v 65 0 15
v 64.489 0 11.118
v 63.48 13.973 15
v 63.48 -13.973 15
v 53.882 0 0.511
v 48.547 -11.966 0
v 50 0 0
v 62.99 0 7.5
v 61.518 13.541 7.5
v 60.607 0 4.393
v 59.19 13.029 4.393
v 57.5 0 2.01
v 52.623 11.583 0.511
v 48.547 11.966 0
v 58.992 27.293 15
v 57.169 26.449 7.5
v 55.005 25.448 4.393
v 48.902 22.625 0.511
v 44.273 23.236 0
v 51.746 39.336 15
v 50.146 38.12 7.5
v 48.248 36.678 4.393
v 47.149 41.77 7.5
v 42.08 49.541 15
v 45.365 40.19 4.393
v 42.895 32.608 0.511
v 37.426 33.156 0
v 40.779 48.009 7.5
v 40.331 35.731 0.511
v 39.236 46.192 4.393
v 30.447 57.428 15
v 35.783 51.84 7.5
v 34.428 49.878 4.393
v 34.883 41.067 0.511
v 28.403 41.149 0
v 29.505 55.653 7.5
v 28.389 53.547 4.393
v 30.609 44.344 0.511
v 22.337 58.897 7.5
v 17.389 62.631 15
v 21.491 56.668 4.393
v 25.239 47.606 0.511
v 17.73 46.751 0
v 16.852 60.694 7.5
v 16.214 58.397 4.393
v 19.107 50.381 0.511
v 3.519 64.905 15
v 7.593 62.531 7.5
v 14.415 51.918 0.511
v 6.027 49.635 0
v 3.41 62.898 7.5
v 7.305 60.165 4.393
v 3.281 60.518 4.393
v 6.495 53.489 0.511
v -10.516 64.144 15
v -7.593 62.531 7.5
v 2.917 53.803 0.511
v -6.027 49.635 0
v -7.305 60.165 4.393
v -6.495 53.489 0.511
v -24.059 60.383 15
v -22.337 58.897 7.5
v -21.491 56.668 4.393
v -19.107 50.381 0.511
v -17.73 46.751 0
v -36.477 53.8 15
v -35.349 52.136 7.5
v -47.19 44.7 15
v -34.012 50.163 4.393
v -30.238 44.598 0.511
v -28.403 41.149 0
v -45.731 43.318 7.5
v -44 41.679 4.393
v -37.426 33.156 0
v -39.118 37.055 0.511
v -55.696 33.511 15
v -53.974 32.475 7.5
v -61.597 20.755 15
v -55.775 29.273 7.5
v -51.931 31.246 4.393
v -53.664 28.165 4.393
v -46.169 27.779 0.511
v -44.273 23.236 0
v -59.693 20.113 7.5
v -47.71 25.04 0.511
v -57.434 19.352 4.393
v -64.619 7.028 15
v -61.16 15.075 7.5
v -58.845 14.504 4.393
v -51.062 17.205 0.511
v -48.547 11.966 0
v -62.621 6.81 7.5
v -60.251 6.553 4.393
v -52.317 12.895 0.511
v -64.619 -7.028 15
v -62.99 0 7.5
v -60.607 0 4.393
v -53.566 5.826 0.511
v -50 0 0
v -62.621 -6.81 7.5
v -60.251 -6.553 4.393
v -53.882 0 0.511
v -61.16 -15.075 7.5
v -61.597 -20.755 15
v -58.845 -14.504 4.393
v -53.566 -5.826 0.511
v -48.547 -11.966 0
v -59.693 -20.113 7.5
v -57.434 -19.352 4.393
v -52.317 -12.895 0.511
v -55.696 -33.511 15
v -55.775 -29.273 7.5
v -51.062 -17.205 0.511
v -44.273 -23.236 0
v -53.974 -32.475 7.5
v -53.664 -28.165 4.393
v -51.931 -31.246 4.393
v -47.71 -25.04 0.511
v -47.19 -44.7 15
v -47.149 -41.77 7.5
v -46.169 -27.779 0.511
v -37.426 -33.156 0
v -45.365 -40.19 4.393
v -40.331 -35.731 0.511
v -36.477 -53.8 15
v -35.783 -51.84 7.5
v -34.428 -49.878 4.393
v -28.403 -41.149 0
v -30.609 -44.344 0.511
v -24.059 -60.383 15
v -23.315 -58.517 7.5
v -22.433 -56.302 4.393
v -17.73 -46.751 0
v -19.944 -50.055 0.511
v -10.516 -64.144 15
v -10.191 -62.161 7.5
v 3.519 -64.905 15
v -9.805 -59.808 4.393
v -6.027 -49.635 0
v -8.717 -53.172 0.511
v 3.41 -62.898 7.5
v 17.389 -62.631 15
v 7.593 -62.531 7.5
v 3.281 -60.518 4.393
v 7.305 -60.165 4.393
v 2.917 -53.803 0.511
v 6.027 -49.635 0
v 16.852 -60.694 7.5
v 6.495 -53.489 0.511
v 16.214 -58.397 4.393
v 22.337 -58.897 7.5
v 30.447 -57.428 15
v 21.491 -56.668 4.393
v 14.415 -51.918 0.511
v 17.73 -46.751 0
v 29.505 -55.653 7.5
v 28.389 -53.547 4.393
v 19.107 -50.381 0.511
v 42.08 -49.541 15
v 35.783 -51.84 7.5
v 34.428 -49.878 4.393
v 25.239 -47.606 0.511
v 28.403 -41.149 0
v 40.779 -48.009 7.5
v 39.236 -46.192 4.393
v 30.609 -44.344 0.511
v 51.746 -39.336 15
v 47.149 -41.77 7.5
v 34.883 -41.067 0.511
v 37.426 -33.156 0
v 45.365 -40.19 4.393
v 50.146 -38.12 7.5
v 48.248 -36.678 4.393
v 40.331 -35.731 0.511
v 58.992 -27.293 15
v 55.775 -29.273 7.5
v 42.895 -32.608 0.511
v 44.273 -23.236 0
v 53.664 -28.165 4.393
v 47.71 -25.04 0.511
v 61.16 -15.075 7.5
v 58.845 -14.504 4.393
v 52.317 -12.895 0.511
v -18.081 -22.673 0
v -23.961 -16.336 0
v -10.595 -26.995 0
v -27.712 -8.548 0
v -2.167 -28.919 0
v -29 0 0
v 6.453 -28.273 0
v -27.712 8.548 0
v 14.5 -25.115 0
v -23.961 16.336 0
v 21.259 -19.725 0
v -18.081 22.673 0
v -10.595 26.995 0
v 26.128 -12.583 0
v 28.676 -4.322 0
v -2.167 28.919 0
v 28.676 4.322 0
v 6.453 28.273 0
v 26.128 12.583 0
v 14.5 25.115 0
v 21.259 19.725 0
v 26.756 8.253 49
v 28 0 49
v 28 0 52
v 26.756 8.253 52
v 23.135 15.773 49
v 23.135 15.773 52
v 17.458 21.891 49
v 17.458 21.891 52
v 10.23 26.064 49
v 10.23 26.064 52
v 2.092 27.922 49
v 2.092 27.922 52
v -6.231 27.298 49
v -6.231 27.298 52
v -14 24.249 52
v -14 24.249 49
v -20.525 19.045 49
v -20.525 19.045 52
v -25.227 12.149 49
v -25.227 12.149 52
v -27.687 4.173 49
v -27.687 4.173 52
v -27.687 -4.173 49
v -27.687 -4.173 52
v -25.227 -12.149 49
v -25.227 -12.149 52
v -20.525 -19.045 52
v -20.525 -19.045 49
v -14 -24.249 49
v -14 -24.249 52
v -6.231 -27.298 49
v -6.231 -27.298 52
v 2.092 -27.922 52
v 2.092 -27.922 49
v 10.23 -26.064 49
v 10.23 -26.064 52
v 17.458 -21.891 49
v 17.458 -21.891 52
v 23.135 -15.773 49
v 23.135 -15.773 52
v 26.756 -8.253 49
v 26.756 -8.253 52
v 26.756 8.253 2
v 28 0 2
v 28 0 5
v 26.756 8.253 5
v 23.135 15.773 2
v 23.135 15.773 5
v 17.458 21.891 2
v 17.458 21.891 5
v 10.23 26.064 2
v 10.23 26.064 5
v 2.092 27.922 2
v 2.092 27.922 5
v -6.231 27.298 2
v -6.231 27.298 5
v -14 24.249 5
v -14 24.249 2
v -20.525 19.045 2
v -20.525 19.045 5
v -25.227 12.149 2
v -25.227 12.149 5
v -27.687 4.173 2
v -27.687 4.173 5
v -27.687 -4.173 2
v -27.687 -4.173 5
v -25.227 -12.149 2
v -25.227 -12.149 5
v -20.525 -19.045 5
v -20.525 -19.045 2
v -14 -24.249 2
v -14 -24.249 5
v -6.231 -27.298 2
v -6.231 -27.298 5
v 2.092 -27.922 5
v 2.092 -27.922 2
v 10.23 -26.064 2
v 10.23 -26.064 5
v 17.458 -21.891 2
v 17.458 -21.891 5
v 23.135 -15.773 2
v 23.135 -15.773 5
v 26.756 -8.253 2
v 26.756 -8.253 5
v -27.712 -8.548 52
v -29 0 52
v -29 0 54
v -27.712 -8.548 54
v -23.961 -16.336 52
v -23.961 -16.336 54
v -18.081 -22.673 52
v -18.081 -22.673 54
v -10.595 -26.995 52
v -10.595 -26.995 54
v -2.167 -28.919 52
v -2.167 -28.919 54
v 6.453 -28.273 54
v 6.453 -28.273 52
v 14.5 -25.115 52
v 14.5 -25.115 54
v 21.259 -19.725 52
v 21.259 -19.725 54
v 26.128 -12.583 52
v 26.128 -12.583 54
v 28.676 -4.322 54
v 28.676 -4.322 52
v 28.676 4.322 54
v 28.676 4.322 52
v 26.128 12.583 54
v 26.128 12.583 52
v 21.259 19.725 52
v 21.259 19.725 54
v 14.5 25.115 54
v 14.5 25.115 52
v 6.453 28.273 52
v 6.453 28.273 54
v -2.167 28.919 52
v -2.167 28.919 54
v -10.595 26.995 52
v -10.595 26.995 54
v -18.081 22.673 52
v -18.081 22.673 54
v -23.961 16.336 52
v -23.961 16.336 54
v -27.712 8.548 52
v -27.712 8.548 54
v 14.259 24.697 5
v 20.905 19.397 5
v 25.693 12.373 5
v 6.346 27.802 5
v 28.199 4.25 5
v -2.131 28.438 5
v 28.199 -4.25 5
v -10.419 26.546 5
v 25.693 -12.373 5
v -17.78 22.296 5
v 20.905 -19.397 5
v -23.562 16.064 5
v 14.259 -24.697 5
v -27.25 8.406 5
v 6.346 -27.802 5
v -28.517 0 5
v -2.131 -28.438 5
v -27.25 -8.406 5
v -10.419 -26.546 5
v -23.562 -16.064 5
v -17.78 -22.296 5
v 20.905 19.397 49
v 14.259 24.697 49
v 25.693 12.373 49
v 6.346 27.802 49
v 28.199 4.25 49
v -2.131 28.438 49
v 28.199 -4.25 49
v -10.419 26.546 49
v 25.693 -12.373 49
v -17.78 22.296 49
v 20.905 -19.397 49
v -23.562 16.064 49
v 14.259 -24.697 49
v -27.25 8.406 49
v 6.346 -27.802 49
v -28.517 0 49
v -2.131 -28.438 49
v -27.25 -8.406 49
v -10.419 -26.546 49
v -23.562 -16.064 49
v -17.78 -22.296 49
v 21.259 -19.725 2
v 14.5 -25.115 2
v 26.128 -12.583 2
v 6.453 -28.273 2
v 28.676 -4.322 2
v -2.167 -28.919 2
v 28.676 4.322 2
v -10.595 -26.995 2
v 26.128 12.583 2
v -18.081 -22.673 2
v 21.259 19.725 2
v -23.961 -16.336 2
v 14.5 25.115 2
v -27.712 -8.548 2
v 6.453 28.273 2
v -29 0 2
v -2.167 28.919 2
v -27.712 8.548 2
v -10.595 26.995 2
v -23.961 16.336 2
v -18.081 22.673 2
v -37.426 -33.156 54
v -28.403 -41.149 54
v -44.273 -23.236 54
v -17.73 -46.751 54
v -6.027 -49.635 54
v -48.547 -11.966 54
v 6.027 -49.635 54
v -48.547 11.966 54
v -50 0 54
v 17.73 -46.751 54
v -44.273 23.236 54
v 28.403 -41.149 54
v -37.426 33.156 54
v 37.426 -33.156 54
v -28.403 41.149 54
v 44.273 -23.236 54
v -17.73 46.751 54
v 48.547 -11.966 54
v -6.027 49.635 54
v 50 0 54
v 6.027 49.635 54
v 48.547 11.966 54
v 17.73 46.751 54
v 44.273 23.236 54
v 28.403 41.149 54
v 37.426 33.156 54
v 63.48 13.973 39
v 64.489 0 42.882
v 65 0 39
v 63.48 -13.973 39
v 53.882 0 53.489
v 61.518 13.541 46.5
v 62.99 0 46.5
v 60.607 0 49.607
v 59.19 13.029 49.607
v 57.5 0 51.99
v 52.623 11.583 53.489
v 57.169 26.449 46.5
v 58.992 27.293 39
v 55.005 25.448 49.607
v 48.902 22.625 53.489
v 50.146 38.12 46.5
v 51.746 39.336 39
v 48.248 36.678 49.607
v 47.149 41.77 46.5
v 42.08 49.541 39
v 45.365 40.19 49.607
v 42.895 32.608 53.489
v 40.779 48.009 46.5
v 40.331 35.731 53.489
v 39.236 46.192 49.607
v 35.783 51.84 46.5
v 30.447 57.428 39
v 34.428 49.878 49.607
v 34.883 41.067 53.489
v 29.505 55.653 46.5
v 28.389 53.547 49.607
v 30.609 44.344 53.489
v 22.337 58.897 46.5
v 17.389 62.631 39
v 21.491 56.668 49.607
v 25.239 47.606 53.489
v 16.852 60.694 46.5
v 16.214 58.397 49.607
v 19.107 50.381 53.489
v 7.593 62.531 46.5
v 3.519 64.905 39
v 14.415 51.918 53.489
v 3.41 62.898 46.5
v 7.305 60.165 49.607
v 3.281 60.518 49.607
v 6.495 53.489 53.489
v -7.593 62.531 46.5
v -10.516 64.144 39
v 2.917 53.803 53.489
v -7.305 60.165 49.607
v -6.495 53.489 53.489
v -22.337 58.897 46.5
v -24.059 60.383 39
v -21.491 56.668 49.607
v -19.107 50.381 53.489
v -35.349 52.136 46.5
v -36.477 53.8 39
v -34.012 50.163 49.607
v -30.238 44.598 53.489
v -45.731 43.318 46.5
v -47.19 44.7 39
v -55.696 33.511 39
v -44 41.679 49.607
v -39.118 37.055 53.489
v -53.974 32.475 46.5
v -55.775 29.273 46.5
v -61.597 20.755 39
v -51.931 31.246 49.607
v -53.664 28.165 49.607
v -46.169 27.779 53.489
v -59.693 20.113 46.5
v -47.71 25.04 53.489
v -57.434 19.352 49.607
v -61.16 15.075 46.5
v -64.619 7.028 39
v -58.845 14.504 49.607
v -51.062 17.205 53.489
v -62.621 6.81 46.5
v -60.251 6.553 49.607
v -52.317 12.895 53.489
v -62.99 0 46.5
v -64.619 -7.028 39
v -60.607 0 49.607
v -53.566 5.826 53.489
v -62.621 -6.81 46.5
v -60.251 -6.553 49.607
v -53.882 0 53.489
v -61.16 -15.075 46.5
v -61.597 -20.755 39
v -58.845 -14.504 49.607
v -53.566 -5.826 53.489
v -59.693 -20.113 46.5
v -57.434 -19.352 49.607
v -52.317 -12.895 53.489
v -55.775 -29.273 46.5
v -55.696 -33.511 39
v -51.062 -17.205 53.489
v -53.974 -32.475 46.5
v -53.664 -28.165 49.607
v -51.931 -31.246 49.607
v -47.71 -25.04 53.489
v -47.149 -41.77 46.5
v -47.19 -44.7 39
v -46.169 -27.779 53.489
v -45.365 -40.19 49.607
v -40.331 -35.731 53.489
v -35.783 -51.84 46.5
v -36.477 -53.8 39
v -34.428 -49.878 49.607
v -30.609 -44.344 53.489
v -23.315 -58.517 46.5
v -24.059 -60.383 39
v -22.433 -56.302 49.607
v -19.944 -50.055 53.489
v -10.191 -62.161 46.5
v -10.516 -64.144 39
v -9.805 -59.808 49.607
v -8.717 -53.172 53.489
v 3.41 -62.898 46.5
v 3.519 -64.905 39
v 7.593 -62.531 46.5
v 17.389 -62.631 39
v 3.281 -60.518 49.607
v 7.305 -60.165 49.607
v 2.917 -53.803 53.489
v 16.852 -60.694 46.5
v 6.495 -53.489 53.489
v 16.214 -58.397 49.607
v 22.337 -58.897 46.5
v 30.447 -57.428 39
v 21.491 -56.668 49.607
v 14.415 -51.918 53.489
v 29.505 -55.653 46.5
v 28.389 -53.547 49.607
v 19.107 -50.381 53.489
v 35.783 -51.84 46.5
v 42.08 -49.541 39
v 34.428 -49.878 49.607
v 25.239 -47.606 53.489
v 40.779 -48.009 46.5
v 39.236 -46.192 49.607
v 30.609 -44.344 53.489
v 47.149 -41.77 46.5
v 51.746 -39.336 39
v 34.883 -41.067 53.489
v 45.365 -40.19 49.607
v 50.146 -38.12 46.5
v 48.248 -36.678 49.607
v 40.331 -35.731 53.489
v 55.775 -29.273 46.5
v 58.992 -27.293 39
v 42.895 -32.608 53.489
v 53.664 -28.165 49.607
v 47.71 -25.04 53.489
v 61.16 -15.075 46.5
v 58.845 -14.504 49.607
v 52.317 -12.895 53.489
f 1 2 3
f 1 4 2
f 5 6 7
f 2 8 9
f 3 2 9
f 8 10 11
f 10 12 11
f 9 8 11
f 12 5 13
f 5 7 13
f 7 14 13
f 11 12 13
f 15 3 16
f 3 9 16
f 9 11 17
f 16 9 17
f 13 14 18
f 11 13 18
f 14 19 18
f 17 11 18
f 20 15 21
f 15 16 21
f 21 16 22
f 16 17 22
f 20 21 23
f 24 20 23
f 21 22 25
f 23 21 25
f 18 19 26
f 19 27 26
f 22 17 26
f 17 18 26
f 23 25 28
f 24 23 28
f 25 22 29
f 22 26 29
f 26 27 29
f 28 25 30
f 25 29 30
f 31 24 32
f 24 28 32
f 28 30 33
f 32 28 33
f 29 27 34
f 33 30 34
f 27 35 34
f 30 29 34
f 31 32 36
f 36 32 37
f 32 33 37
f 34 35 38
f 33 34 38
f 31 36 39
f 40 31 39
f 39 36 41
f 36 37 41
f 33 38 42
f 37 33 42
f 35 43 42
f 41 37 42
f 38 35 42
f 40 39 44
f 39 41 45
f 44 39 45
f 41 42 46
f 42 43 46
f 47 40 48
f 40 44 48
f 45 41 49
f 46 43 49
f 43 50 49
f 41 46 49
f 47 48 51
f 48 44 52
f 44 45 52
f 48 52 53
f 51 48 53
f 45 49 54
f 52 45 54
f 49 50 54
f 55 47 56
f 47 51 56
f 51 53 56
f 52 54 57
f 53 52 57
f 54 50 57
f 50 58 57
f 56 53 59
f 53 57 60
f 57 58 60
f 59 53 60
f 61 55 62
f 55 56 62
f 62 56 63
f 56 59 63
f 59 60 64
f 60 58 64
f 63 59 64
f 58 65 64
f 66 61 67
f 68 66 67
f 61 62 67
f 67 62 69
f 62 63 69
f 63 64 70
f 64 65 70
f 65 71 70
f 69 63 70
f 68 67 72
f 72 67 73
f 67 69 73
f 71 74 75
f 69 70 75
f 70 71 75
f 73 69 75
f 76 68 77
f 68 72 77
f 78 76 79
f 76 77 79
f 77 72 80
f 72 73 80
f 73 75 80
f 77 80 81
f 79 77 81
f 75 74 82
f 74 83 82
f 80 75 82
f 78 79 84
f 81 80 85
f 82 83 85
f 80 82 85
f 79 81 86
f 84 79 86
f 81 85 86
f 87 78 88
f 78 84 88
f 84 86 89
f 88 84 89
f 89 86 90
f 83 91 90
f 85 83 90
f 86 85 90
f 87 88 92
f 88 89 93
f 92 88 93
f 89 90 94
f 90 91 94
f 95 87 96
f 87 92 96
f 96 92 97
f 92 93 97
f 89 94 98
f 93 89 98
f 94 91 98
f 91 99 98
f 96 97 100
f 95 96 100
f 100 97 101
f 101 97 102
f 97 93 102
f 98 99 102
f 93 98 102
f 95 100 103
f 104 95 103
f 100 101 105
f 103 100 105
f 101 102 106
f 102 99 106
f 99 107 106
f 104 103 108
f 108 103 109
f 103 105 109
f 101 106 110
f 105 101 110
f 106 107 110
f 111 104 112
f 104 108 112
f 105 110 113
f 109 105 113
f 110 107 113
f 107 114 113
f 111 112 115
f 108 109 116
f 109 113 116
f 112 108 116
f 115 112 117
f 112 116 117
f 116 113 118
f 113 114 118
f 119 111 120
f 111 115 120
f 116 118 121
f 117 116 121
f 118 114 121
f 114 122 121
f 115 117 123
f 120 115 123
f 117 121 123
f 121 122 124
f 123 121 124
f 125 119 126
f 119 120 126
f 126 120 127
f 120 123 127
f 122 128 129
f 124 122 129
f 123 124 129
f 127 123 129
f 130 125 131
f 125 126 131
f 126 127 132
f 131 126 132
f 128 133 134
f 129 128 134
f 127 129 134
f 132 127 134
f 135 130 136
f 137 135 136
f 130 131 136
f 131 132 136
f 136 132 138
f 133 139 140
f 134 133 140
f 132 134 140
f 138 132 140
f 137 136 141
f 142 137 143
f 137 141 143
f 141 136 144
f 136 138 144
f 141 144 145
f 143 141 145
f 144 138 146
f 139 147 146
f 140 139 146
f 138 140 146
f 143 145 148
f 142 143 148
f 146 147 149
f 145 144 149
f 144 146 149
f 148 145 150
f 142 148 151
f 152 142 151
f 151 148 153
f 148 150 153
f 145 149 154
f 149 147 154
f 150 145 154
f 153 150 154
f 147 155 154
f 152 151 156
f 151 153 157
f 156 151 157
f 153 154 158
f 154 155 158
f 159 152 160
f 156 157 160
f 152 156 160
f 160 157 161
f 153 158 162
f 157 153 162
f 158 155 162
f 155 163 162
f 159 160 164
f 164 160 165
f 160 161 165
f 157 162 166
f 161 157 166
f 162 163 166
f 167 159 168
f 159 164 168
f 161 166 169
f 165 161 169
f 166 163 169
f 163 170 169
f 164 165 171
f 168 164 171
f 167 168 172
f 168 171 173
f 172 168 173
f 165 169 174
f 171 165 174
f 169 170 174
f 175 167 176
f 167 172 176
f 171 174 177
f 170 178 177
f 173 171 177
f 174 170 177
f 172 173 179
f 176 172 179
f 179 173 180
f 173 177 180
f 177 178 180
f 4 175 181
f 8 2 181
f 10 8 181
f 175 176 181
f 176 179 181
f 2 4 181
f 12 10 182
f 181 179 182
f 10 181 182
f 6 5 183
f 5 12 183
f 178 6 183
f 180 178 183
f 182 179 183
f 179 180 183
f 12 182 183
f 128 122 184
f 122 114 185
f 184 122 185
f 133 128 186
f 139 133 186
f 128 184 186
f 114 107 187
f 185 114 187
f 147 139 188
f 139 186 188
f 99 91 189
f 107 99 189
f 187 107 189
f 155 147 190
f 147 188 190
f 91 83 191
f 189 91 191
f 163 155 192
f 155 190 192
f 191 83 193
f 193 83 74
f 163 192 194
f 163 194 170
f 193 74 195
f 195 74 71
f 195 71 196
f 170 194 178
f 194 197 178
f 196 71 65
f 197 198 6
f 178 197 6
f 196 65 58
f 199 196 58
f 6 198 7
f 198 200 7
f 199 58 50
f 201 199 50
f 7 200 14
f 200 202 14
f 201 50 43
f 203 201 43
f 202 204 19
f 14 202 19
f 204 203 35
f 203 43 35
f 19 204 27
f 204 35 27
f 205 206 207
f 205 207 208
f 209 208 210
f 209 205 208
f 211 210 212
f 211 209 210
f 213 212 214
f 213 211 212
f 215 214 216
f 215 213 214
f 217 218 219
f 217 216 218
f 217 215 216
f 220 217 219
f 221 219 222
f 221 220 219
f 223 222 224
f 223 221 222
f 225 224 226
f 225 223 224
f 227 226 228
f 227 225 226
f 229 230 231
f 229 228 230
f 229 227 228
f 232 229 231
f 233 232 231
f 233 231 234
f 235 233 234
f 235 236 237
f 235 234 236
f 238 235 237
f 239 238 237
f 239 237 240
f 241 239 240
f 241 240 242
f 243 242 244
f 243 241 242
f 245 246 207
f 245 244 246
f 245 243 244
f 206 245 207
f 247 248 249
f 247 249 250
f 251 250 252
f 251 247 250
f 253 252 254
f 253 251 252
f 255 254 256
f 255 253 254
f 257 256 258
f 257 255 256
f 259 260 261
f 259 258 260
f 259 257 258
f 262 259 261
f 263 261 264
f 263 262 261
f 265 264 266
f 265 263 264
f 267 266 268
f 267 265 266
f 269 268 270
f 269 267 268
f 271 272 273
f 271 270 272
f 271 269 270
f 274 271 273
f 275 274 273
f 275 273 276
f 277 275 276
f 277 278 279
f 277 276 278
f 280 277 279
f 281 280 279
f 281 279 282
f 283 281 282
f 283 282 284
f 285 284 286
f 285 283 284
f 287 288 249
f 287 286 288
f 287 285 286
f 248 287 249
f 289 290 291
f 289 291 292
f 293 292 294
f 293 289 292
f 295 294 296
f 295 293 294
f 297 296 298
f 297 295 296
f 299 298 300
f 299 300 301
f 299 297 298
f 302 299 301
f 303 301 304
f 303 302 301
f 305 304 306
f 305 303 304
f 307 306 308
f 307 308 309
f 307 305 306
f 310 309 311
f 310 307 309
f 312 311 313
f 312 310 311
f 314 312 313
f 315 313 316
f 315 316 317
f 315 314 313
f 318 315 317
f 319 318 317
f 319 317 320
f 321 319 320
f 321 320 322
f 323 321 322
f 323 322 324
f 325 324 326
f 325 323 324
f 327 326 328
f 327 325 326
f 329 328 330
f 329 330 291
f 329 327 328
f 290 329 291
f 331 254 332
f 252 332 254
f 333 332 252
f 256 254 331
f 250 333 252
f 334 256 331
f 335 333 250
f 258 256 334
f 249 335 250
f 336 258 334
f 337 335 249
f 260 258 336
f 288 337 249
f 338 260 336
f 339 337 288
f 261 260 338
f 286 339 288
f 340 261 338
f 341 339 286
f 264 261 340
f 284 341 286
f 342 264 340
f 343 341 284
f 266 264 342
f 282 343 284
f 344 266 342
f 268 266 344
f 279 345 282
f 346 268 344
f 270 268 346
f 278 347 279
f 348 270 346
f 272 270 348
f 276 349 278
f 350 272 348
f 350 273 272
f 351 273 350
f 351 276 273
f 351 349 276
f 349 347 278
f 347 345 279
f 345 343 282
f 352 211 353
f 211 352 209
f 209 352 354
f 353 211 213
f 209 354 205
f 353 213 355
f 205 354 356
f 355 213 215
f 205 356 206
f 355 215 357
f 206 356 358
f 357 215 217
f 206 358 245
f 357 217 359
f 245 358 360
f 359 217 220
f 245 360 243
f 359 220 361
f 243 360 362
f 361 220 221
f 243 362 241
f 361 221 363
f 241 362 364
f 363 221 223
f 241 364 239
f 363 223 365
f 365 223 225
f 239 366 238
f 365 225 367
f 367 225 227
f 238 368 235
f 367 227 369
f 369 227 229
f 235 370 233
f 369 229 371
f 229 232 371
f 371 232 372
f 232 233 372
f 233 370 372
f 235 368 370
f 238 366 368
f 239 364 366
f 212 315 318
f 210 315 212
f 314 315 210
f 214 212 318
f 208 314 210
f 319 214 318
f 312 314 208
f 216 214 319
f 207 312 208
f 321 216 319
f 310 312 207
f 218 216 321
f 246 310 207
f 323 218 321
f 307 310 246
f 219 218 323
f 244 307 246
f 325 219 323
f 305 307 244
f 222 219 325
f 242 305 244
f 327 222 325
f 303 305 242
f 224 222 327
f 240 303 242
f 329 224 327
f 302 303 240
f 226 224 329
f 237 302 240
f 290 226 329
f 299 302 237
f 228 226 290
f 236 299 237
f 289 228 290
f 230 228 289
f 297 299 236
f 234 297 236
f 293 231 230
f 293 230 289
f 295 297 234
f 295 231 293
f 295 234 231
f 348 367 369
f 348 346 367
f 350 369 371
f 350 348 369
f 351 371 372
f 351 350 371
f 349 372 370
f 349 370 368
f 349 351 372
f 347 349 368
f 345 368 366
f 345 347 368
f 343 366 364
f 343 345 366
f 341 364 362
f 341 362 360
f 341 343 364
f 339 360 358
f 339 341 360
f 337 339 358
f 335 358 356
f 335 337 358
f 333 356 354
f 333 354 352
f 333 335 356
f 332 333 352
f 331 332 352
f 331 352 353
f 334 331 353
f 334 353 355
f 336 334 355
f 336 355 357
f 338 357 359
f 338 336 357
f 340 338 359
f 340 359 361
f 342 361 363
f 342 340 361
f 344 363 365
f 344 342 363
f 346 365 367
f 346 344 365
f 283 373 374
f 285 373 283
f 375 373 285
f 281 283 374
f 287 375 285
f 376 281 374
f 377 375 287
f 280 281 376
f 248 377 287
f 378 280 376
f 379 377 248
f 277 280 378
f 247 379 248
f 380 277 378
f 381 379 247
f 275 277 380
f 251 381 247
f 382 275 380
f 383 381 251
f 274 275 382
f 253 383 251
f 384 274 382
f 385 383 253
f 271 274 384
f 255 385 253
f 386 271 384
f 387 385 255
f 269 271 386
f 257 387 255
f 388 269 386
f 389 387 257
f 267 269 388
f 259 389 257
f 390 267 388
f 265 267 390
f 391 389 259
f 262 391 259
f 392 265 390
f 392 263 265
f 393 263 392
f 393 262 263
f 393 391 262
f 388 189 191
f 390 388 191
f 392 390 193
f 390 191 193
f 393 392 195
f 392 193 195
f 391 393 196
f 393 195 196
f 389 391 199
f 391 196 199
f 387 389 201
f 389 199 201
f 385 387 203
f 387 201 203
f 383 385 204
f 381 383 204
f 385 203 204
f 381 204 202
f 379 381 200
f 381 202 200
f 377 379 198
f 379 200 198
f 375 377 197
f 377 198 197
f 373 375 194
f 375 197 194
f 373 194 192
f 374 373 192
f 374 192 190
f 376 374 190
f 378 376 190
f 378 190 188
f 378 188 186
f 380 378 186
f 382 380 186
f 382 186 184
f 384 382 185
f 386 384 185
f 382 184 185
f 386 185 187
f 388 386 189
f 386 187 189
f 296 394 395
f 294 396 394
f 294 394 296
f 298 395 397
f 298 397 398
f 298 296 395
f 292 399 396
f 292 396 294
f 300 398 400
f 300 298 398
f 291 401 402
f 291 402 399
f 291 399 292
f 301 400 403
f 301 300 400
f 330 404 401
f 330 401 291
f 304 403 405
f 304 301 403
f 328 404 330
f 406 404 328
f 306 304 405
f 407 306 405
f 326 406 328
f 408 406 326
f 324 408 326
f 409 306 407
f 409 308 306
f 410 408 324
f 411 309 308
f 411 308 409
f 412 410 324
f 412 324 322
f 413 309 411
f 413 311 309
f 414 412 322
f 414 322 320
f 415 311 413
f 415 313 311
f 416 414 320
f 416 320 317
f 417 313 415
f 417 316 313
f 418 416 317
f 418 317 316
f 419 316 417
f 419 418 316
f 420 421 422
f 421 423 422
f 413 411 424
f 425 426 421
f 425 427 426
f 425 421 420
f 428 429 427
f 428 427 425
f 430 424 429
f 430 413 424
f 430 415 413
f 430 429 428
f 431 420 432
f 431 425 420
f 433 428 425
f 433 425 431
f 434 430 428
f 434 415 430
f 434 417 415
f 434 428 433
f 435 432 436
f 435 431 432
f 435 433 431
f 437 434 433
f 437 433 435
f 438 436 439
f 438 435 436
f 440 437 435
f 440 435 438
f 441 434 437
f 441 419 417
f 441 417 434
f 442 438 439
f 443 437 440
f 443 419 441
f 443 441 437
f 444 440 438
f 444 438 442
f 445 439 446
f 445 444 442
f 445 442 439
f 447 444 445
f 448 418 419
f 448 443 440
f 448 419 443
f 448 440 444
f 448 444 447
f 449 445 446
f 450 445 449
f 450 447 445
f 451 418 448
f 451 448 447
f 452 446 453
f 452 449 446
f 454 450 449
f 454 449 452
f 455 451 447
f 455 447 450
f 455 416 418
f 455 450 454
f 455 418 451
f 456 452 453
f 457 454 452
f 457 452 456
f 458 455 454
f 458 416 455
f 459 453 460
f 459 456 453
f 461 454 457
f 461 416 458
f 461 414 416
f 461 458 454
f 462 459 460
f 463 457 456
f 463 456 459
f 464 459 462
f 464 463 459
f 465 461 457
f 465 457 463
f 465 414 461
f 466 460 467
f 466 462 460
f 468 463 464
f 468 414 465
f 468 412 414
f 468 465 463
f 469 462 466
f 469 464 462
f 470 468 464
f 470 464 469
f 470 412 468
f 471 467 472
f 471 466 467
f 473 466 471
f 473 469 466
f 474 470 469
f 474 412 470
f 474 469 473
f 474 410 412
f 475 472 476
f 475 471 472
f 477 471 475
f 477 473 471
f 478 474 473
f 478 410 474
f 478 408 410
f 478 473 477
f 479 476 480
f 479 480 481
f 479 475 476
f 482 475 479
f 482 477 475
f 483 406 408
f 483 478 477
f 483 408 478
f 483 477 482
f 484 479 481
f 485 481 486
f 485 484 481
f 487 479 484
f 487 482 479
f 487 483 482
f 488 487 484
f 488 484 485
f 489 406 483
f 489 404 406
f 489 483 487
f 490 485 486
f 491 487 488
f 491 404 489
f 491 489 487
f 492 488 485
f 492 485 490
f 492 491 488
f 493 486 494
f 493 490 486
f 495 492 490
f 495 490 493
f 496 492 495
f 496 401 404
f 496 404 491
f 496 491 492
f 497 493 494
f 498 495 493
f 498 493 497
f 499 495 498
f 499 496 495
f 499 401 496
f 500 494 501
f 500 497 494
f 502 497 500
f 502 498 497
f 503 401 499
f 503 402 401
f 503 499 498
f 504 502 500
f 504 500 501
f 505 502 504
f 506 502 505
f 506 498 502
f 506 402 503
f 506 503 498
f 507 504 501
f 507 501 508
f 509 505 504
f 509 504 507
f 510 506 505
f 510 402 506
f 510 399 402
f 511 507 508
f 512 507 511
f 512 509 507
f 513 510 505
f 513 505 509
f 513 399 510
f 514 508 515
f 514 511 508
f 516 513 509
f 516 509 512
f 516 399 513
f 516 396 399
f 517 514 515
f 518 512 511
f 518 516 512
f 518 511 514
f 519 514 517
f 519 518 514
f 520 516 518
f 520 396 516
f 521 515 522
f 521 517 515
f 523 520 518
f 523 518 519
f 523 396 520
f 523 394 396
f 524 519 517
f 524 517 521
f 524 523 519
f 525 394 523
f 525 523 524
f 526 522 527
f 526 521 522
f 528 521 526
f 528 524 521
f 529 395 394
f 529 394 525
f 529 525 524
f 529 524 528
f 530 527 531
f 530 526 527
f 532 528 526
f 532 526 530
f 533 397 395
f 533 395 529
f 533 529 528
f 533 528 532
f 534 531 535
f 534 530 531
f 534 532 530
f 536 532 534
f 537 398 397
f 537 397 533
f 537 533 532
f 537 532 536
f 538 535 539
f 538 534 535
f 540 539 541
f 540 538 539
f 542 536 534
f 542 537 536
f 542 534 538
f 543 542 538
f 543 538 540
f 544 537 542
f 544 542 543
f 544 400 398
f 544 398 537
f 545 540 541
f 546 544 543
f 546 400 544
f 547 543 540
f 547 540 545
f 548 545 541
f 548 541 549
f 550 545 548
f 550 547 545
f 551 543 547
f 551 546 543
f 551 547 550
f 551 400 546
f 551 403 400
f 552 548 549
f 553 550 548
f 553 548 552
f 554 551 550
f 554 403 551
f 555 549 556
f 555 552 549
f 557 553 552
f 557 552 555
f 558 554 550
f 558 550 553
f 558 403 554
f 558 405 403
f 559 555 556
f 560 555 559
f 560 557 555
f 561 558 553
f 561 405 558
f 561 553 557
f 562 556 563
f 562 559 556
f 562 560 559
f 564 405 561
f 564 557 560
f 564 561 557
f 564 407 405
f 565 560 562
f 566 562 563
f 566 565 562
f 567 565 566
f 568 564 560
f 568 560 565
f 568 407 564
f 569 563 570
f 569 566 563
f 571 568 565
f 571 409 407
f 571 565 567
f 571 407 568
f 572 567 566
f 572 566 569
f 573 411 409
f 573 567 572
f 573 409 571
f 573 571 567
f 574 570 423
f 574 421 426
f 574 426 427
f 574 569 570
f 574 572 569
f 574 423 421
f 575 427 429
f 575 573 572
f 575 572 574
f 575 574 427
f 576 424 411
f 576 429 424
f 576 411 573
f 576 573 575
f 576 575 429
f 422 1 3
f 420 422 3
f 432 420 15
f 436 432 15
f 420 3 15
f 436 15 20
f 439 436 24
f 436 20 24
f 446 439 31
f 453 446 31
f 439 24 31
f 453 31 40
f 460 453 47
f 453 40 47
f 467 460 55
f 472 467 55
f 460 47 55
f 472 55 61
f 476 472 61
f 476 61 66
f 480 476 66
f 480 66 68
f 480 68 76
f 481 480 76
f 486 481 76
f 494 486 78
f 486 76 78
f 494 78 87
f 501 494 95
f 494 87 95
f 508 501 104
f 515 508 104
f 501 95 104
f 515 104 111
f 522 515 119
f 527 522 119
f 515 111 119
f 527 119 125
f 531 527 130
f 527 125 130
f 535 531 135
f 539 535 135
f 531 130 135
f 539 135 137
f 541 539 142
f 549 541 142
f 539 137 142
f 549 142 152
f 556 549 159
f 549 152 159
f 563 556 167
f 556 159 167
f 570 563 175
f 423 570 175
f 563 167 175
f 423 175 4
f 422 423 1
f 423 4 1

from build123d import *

# Parameters (mm, degrees)
SKETCH_1_R          = 65
SKETCH_1_R_2        = 28
EXTRUDE_1_DEPTH     = 54
SKETCH_2_R          = 29
CUT_EXTRUDE_1_DEPTH = 2
CUT_EXTRUDE_START   = -2
SKETCH_3_R          = 29
CUT_EXTRUDE_2_DEPTH = 2
SKETCH_4_W          = 1
SKETCH_4_H          = 44
FILLET_1_R          = 15


with BuildPart() as part:
    # 草图1 → 凸台-拉伸1 (new body)
    with BuildSketch(Plane.XY):
        Circle(SKETCH_1_R)
        Circle(SKETCH_1_R_2, mode=Mode.SUBTRACT)
    extrude(amount=EXTRUDE_1_DEPTH)

    # 草图2 → 切除-拉伸1 (cut)
    with BuildSketch(Plane(origin=(0, 0, 0), x_dir=(-1, 0, 0), z_dir=(0, 0, -1))):
        Circle(SKETCH_2_R)
    extrude(amount=-CUT_EXTRUDE_1_DEPTH, mode=Mode.SUBTRACT)

    # 草图3 → 切除-拉伸2 (cut)
    with BuildSketch(Plane.XY.offset(54).offset(CUT_EXTRUDE_START)):
        with Locations(Location((0, 0, 0), (0, 0, 180))):
            Circle(SKETCH_3_R)
    extrude(amount=CUT_EXTRUDE_2_DEPTH, mode=Mode.SUBTRACT)

    # 草图4 → 切除-旋转1 (revolve, cut)
    with BuildSketch(Plane(origin=(0, 0, 0), x_dir=(1, 0, 0), z_dir=(0, 1, 0))):
        with Locations((-28.017381105, -27)):
            Rectangle(SKETCH_4_W, SKETCH_4_H)
    revolve(axis=Axis((0, 0, 0), (0, 0, 1)), mode=Mode.SUBTRACT)

    # 圆角1
    fillet_1_edges = [part.edges().sort_by_distance(p)[0] for p in [
        (-65, 0, 0),
        (-65, 0, 54),
    ]]
    fillet(fillet_1_edges, radius=FILLET_1_R)


solid = part.part
